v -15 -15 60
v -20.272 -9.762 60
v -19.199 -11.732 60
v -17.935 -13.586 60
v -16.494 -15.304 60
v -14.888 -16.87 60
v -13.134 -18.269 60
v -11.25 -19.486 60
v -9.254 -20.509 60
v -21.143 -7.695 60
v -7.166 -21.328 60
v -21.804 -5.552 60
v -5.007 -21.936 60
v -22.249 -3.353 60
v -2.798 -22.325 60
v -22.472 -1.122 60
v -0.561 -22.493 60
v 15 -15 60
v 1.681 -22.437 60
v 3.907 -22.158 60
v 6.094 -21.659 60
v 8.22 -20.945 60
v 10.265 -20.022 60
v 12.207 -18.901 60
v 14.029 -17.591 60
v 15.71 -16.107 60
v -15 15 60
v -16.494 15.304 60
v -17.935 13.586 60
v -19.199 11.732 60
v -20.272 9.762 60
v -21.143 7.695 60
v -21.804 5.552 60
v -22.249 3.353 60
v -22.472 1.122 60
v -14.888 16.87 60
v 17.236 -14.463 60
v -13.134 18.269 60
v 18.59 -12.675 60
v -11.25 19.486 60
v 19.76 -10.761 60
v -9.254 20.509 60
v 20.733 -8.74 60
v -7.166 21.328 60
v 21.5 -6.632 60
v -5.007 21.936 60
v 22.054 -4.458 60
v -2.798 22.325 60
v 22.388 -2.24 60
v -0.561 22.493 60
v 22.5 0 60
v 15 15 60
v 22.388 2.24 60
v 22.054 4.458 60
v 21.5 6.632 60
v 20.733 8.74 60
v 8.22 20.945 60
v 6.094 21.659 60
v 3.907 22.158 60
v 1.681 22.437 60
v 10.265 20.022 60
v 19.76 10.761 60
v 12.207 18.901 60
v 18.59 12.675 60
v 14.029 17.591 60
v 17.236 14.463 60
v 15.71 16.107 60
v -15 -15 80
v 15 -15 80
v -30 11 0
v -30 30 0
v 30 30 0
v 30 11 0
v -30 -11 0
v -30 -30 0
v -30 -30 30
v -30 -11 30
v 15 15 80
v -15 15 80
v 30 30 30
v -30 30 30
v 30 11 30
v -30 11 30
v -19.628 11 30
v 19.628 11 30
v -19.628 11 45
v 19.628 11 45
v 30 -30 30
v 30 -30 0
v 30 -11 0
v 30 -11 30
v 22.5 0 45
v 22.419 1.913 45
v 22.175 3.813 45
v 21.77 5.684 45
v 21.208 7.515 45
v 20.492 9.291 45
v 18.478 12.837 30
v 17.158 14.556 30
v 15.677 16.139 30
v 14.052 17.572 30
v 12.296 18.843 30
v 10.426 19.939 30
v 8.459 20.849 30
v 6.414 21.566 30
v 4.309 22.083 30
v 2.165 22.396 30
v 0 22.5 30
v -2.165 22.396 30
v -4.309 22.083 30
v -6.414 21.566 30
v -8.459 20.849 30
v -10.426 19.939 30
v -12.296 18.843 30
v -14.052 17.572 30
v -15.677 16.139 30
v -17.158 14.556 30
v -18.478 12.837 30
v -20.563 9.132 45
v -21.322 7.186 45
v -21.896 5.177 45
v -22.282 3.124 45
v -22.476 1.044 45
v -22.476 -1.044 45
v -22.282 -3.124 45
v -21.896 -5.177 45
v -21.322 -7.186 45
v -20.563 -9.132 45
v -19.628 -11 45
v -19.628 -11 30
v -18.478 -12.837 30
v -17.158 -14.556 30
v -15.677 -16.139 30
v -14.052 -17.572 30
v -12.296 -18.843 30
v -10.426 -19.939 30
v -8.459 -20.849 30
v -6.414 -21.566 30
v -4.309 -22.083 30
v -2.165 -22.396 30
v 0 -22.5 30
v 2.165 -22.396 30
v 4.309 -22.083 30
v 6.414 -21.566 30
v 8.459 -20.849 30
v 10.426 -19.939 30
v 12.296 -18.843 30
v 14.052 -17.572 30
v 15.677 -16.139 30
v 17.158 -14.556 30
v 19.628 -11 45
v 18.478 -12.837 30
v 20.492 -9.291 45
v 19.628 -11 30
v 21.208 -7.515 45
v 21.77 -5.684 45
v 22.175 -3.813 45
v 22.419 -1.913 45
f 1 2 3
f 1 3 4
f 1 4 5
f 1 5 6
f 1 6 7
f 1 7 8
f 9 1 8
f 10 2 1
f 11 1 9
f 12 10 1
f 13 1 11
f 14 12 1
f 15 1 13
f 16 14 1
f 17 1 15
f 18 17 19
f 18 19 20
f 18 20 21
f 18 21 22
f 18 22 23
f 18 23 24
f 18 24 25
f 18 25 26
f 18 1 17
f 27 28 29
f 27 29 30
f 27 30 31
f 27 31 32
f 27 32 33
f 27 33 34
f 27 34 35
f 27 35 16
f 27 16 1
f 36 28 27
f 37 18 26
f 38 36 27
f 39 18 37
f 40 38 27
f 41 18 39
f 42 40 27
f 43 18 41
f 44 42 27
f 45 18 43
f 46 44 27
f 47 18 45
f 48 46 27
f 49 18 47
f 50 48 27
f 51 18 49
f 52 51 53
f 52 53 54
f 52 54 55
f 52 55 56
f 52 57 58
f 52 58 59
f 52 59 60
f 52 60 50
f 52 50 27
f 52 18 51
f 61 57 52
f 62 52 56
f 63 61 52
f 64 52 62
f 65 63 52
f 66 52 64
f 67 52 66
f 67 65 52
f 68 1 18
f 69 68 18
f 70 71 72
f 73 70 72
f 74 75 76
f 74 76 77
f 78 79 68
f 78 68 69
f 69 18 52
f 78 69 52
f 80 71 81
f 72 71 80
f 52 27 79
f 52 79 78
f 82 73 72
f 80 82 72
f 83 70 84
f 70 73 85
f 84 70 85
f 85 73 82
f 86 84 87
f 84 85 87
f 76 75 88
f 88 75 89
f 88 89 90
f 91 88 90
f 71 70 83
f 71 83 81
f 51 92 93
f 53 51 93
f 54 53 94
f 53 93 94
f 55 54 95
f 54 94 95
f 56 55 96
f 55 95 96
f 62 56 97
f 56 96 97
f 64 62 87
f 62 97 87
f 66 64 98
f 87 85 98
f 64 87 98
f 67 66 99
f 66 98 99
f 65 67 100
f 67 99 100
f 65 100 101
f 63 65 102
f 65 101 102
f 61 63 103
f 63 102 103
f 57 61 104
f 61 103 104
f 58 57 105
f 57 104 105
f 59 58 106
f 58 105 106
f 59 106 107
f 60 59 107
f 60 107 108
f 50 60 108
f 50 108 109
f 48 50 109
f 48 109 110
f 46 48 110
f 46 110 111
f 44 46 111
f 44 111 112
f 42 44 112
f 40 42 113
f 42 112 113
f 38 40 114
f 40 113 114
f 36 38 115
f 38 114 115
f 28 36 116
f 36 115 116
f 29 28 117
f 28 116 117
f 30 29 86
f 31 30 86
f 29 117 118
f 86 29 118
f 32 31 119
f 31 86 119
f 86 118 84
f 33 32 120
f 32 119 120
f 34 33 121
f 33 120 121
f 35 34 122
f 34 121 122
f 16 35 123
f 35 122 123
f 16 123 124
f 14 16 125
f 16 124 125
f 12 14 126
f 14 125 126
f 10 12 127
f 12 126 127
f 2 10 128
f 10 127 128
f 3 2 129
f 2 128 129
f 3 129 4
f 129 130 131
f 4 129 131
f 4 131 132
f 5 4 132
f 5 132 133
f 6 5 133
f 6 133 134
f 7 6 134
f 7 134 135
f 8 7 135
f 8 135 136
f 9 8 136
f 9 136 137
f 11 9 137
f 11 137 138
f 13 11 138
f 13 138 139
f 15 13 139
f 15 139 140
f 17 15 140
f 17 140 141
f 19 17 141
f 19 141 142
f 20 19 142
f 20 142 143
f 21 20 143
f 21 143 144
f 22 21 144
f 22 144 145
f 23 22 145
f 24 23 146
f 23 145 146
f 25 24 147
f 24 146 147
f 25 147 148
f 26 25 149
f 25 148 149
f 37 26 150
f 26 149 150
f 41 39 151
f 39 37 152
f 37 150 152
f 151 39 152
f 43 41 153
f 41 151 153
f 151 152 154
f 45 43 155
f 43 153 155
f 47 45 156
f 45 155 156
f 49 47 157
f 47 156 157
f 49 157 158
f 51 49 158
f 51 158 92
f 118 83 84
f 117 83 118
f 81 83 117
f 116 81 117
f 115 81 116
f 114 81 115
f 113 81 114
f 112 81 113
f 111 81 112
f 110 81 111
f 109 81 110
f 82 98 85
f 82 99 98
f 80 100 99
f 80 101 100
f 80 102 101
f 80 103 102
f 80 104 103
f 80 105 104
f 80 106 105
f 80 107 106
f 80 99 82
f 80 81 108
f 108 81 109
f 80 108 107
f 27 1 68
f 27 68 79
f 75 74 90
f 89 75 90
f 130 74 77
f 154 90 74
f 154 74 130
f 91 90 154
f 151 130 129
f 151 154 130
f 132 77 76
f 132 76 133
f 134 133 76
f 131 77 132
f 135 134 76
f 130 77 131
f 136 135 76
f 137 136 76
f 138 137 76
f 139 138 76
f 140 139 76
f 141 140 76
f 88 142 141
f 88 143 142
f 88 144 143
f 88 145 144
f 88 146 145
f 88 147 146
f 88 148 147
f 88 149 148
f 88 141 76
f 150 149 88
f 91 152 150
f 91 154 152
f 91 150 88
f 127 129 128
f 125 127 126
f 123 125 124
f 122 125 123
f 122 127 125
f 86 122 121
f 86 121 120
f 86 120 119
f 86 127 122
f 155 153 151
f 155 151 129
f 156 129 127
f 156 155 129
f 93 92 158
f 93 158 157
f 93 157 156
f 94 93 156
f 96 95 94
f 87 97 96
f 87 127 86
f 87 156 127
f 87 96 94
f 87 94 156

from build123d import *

# Parameters (mm, degrees)
F0_W     = 60
F0_H     = 60
F1_DEPTH = 30
F2_R     = 22.5
F3_DEPTH = 30
F4_W     = 30
F4_H     = 30
F5_DEPTH = 20
F6_W     = 22
F6_H     = 45
F7_DEPTH = 60


with BuildPart() as f1:
    # F0 (on Top) → F1 (new body)
    with BuildSketch(Plane.XY):
        Rectangle(F0_W, F0_H)
    extrude(amount=F1_DEPTH)

    # F2 (on face) → F3 (join)
    with BuildSketch(Plane.XY.offset(30)):
        Circle(F2_R)
    extrude(amount=F3_DEPTH)

    # F4 (on face) → F5 (join)
    with BuildSketch(Plane.XY.offset(60)):
        Rectangle(F4_W, F4_H)
    extrude(amount=F5_DEPTH)

    # F6 (on face) → F7 (cut)
    with BuildSketch(Plane.YZ.offset(30)):
        with Locations((0, 22.5)):
            Rectangle(F6_W, F6_H)
    extrude(amount=-F7_DEPTH, mode=Mode.SUBTRACT)


solid = f1.part
